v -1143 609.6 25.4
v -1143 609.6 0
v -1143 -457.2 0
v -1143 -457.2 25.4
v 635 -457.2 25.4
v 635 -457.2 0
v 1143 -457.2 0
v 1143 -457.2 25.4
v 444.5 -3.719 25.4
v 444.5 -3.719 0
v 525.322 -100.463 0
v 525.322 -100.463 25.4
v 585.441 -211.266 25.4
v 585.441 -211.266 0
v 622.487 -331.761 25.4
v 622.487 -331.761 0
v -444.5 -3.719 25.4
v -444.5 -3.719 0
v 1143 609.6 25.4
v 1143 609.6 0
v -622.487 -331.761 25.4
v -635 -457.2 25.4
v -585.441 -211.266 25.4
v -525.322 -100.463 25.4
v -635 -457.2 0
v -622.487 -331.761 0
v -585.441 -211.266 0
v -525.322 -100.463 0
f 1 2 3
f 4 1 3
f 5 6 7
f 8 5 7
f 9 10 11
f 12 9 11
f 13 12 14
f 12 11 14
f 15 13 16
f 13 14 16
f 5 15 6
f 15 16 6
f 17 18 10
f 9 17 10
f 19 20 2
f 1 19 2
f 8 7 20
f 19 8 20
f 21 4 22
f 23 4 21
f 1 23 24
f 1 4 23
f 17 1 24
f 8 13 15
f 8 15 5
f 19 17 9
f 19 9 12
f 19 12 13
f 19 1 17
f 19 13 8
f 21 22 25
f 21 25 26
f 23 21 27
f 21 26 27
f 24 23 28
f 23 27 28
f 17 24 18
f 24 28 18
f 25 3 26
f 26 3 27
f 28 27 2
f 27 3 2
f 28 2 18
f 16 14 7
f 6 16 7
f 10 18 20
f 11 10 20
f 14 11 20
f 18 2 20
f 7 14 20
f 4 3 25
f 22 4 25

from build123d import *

# Parameters (mm, degrees)
F1_DEPTH = 25.4
F2_DEPTH = 25.4


with BuildPart() as f1:
    # F0 (on Top) → F1 (new body)
    with BuildSketch(Plane.XY):
        with BuildLine():
            Line((0, 609.6), (-1143, 609.6))
            Line((-1143, 609.6), (-1143, 0))
            Line((-1143, 0), (-1143, -457.2))
            Line((-1143, -457.2), (-635, -457.2))
            ThreePointArc((-635, -457.2), (-585.441073, -211.265558), (-444.5, -3.719295))
            Line((-444.5, -3.719295), (444.5, -3.719295))
            ThreePointArc((444.5, -3.719295), (585.441073, -211.265558), (635, -457.2))
            Line((635, -457.2), (1143, -457.2))
            Line((1143, -457.2), (1143, 0))
            Line((1143, 0), (1143, 609.6))
            Line((1143, 609.6), (0, 609.6))
        make_face()
    extrude(amount=F1_DEPTH)

    # F0 (on Top) → F2 (join)
    with BuildSketch(Plane.XY):
        with BuildLine():
            Line((0, 609.6), (-1143, 609.6))
            Line((-1143, 609.6), (-1143, 0))
            Line((-1143, 0), (-1143, -457.2))
            Line((-1143, -457.2), (-635, -457.2))
            ThreePointArc((-635, -457.2), (-585.441073, -211.265558), (-444.5, -3.719295))
            Line((-444.5, -3.719295), (444.5, -3.719295))
            ThreePointArc((444.5, -3.719295), (585.441073, -211.265558), (635, -457.2))
            Line((635, -457.2), (1143, -457.2))
            Line((1143, -457.2), (1143, 0))
            Line((1143, 0), (1143, 609.6))
            Line((1143, 609.6), (0, 609.6))
        make_face()
    extrude(amount=F2_DEPTH)


solid = f1.part
